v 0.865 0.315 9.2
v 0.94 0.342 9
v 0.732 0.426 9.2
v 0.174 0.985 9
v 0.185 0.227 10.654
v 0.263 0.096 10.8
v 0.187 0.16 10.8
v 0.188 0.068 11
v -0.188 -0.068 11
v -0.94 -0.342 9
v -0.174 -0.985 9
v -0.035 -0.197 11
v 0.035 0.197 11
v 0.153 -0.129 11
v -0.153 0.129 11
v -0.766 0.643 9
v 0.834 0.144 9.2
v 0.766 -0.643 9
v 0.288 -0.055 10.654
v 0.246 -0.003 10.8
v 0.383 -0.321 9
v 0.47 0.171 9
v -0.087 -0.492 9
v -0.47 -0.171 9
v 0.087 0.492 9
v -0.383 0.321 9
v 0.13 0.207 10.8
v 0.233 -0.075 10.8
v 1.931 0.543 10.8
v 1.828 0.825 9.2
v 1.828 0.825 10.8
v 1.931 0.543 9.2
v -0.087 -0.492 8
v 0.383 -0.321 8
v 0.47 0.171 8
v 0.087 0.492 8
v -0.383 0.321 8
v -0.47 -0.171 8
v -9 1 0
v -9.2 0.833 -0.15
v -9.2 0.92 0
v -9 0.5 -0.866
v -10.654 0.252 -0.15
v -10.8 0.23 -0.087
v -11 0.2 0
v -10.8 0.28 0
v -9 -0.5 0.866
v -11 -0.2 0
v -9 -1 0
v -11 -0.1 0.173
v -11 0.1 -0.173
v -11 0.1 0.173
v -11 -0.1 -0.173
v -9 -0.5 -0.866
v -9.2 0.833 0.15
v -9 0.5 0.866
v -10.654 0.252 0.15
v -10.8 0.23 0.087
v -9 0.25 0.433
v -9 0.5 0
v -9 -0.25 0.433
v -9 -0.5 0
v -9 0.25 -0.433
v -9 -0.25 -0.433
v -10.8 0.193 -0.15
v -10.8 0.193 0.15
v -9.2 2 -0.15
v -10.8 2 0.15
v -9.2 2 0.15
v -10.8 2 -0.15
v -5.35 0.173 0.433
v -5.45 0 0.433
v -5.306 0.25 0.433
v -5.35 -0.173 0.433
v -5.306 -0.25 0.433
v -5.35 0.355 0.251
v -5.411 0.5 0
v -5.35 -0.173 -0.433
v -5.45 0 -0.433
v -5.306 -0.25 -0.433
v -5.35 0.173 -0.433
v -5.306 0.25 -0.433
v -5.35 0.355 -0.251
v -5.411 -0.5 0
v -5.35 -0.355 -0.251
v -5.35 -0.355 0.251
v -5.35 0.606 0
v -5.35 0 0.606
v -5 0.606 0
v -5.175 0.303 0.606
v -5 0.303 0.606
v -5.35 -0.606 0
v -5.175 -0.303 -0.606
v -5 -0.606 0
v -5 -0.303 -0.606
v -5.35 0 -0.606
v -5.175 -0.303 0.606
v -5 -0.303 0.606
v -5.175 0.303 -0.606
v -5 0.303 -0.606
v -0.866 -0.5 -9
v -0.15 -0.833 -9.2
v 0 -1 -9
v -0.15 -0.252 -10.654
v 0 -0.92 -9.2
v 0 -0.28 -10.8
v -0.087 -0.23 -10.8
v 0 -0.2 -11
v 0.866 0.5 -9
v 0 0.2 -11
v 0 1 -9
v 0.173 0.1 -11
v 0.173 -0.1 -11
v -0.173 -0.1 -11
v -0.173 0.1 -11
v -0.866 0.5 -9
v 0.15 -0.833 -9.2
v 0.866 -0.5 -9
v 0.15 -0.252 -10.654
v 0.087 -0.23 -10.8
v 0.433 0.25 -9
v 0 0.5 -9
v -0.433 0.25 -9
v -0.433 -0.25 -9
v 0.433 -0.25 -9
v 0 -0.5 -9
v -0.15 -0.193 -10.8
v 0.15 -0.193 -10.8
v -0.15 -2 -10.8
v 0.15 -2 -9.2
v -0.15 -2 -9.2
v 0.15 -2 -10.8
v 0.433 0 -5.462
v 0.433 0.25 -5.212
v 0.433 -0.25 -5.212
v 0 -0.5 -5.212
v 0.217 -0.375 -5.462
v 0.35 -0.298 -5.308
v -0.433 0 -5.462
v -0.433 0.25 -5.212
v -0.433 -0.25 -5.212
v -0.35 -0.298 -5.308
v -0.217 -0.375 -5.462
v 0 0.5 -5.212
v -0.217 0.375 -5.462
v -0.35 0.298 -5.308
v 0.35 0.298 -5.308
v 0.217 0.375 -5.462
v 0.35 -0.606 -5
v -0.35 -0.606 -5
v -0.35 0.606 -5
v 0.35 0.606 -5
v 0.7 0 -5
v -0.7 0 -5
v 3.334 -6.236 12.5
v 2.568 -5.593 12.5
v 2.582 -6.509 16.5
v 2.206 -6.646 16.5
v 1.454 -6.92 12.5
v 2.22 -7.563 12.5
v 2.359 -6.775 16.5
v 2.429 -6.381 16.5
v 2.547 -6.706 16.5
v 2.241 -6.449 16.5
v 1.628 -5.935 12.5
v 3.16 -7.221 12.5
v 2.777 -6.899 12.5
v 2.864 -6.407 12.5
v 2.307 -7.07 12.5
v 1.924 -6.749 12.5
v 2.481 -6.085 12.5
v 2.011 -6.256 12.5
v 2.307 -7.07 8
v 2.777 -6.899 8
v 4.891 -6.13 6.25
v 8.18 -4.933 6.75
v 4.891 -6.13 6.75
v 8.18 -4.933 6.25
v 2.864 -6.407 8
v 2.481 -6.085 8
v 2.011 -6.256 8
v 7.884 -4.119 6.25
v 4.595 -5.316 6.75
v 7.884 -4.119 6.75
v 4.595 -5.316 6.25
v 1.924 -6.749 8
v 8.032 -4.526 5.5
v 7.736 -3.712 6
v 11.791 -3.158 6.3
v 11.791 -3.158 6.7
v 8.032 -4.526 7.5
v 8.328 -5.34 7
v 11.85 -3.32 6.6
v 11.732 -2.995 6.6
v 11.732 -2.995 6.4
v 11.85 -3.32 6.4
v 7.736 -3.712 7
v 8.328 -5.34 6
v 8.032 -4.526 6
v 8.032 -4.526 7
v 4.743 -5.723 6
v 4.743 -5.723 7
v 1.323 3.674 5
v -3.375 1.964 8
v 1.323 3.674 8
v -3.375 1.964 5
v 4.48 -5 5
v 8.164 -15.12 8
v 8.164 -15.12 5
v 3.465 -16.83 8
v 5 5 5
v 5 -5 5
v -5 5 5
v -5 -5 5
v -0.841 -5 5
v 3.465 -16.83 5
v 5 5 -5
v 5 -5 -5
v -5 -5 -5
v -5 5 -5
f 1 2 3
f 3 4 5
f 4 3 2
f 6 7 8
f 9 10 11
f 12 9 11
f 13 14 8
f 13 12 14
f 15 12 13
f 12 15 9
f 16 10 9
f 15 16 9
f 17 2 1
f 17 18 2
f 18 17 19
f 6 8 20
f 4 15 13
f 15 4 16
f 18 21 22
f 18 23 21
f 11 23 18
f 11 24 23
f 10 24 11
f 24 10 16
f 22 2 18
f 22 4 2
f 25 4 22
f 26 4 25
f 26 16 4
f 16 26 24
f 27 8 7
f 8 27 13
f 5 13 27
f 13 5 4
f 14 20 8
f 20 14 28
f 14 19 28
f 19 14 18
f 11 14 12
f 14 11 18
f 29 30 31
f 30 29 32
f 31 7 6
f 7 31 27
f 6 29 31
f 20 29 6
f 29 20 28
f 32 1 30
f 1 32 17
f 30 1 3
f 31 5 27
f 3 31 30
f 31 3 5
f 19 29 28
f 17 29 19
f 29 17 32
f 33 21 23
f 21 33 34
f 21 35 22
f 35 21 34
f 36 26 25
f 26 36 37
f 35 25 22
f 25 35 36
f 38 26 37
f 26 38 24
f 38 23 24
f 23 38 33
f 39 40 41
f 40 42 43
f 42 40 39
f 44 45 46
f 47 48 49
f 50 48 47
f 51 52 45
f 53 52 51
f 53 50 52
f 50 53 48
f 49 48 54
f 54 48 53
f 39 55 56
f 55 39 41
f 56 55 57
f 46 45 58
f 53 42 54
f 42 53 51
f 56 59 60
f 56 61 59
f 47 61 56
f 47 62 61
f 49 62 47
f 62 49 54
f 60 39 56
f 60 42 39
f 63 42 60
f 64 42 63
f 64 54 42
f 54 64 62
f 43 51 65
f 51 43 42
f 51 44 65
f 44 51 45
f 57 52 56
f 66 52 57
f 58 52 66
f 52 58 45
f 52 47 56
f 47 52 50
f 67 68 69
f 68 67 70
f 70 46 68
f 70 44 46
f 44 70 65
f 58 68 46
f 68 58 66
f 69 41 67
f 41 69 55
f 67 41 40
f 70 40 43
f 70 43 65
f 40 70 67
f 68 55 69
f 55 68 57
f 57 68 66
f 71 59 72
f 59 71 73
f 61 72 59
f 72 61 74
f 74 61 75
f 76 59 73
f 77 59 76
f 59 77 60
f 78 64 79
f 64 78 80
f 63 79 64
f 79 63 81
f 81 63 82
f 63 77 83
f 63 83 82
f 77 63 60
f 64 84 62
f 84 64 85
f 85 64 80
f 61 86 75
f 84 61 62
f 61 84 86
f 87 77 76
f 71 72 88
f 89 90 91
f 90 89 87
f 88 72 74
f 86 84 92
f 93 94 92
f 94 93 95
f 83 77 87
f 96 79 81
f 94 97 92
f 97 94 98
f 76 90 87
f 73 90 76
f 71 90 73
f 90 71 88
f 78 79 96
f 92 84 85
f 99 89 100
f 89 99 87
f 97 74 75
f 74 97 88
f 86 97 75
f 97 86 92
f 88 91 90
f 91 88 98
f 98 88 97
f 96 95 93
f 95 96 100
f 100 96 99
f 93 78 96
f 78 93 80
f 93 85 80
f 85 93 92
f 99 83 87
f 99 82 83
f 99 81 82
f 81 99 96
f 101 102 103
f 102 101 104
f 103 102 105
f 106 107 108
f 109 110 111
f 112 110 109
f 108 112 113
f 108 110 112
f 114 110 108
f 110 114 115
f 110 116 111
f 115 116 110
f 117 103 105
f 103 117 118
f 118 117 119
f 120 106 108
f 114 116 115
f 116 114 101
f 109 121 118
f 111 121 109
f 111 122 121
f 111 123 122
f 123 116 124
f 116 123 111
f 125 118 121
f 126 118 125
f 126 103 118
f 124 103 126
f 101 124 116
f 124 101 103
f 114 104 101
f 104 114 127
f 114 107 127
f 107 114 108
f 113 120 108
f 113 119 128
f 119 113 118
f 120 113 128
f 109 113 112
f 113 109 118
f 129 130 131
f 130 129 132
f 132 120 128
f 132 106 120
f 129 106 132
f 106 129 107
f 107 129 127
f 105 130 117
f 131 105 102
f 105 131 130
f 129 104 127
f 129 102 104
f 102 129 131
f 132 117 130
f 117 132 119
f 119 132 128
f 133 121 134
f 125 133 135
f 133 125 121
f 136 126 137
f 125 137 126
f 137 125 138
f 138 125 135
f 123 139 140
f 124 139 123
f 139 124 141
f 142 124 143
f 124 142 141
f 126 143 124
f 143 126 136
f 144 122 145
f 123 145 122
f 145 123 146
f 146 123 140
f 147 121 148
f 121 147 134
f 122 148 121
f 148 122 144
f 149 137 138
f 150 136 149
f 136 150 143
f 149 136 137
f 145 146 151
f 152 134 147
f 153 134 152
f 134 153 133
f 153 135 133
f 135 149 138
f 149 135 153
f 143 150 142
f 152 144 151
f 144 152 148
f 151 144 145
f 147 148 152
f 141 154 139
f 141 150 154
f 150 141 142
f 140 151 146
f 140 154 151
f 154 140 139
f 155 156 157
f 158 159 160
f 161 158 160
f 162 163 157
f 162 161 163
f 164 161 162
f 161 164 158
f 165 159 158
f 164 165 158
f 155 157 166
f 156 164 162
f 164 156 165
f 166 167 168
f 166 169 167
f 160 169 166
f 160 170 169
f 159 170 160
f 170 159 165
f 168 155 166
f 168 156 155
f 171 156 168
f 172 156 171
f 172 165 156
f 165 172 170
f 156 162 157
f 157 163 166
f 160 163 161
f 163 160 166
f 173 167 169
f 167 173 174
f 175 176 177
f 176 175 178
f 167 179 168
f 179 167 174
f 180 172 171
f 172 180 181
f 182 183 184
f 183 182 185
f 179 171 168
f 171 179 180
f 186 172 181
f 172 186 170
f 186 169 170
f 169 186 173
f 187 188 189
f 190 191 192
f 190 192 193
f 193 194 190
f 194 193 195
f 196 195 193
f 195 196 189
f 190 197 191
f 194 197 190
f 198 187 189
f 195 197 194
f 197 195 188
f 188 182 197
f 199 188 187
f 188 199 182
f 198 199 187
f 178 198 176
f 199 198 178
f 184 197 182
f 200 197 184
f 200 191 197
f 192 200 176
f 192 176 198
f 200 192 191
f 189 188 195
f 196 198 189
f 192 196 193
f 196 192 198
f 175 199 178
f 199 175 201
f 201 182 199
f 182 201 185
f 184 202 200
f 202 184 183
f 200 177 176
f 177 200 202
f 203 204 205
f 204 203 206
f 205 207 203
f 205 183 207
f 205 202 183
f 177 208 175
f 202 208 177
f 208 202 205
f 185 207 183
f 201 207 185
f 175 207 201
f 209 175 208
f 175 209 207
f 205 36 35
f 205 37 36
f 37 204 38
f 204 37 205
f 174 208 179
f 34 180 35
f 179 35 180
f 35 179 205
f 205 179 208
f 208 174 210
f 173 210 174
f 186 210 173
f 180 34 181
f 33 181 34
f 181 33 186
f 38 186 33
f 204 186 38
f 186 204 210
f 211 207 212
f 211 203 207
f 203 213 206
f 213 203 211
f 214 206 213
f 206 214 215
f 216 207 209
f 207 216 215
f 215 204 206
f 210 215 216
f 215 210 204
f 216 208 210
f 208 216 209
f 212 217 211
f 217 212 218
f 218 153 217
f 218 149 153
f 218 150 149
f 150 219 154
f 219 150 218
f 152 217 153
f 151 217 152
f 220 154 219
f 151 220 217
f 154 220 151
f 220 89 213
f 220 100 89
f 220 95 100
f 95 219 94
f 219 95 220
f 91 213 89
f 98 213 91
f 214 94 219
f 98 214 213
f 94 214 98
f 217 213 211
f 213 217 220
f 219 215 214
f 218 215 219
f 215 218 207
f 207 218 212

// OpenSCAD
//---------------------------------------------------------------
//-- Openscad Attachment library
//-- Attach parts easily. Make your designs more reusable and clean
//---------------------------------------------------------------
//-- This is a component of the obiscad opescad tools by Obijuan
//-- (C) Juan Gonzalez-Gomez (Obijuan)
//-- Sep-2012
//---------------------------------------------------------------
//-- Released under the GPL license
//---------------------------------------------------------------

use <vector.scad>

//--------------------------------------------------------------------
//-- Draw a connector
//-- A connector is defined a 3-tuple that consist of a point
//--- (the attachment point), and axis (the attachment axis) and
//--- an angle the connected part should be rotate around the 
//--  attachment axis
//--
//--- Input parameters:
//--
//--  Connector c = [p , v, ang] where:
//--
//--     p : The attachment point
//--     v : The attachment axis
//--   ang : the angle
//--------------------------------------------------------------------
module connector(c)
{
  //-- Get the three components from the connector
  p = c[0];
  v = c[1];
  ang = c[2];

  //-- Draw the attachment poing
  color("Gray") point(p);

  //-- Draw the attachment axis vector (with a mark)
  translate(p)
    rotate(a=ang, v=v)
    color("Gray") vector(unitv(v)*6, l_arrow=2, mark=true);
}


//-------------------------------------------------------------------------
//--  ATTACH OPERATOR
//--  This operator applies the necesary transformations to the 
//--  child (attachable part) so that it is attached to the main part
//--  
//--  Parameters
//--    a -> Connector of the main part
//--    b -> Connector of the attachable part
//-------------------------------------------------------------------------
module attach(a,b)
{
  //-- Get the data from the connectors
  pos1 = a[0];  //-- Attachment point. Main part
  v    = a[1];  //-- Attachment axis. Main part
  roll = a[2];  //-- Rolling angle
  
  pos2 = b[0];  //-- Attachment point. Attachable part
  vref = b[1];  //-- Atachment axis. Attachable part
                //-- The rolling angle of the attachable part is not used

  //-------- Calculations for the "orientate operator"------
  //-- Calculate the rotation axis
  cref = cross(vref,v);
  raxis = norm(cref) == 0 ? ortho2(vref) : cref;
    
  //-- Calculate the angle between the vectors
  ang = anglev(vref,v);
  //--------------------------------------------------------.-
  //-- Apply the transformations to the child ---------------------------

  //-- Place the attachable part on the main part attachment point
  translate(pos1)
    //-- Orientate operator. Apply the orientation so that
    //-- both attachment axis are paralell. Also apply the roll angle
    rotate(a=roll, v=v)  rotate(a=ang, v=raxis)
      //-- Attachable part to the origin
      translate(-pos2)
	children([0:$children-1]);
}


//--------------------------------------------------------------------
//---   An example of the attach operator
//---  
//---  There are two parts: the main body and an arm
//---  They both are cubes (for simplicity)
//---
//--   In the main body there are 2 connectors defined, so that
//--  the arm can be attached to any of them (or both if you like)
//------------------------------------------------------------------

//-- In the debug mode the connectors and additional information
//-- are shown
debug=true;

//-- Define the Main part: A cube
//-- Two attachment points are defined: one on the top, another in the
//--- left side
size = [10,10,10];

//-- Connectors defined:

//--     Att. point       Att. Axis  Roll
c1 = [ [0,0,size[2]/2],  [0,0,1],     20];  //-- Connector on the top
c2 = [ [-size[0]/2,0,0], [-1,0,0],    90];  //-- Connector on the left
c3 = [ [0,0,-size[0]/2], [0,0,-1],    90];  //-- Connector on the bottom, degenerate case !


//-- Draw the main part along with the connectors (for debugging)
cube(size,center=true);

//-- In debug mode: Draw the main part connectors!
if (debug) {
  connector(c1);
  connector(c2);
  connector(c3);
}

//-- Define the Attachable part. It is another cube, with one connector
asize = [5,20,3];
a = [ [0,asize[1]/2-3,-asize[2]/2], [0,0,1], 0  ];


//-- Do the attach!
//-- Just change c1 by c2 to attach the part to the other 
//-- connector. Super-easy!! :-)
//-- Modify the c1 and c2 roll angle for rotating the attachable
//--  part to the desired orientation
attach(c1,a)
  //-- This is the attachable part! 
  union() {
    cube(asize,center=true);  //-- The part

    //-- In debug mode show additional info:
    if (debug) {
      frame(l=10);    //-- The part frame of reference.
      connector(a);   //-- Show the part connector
    }
  };

  
